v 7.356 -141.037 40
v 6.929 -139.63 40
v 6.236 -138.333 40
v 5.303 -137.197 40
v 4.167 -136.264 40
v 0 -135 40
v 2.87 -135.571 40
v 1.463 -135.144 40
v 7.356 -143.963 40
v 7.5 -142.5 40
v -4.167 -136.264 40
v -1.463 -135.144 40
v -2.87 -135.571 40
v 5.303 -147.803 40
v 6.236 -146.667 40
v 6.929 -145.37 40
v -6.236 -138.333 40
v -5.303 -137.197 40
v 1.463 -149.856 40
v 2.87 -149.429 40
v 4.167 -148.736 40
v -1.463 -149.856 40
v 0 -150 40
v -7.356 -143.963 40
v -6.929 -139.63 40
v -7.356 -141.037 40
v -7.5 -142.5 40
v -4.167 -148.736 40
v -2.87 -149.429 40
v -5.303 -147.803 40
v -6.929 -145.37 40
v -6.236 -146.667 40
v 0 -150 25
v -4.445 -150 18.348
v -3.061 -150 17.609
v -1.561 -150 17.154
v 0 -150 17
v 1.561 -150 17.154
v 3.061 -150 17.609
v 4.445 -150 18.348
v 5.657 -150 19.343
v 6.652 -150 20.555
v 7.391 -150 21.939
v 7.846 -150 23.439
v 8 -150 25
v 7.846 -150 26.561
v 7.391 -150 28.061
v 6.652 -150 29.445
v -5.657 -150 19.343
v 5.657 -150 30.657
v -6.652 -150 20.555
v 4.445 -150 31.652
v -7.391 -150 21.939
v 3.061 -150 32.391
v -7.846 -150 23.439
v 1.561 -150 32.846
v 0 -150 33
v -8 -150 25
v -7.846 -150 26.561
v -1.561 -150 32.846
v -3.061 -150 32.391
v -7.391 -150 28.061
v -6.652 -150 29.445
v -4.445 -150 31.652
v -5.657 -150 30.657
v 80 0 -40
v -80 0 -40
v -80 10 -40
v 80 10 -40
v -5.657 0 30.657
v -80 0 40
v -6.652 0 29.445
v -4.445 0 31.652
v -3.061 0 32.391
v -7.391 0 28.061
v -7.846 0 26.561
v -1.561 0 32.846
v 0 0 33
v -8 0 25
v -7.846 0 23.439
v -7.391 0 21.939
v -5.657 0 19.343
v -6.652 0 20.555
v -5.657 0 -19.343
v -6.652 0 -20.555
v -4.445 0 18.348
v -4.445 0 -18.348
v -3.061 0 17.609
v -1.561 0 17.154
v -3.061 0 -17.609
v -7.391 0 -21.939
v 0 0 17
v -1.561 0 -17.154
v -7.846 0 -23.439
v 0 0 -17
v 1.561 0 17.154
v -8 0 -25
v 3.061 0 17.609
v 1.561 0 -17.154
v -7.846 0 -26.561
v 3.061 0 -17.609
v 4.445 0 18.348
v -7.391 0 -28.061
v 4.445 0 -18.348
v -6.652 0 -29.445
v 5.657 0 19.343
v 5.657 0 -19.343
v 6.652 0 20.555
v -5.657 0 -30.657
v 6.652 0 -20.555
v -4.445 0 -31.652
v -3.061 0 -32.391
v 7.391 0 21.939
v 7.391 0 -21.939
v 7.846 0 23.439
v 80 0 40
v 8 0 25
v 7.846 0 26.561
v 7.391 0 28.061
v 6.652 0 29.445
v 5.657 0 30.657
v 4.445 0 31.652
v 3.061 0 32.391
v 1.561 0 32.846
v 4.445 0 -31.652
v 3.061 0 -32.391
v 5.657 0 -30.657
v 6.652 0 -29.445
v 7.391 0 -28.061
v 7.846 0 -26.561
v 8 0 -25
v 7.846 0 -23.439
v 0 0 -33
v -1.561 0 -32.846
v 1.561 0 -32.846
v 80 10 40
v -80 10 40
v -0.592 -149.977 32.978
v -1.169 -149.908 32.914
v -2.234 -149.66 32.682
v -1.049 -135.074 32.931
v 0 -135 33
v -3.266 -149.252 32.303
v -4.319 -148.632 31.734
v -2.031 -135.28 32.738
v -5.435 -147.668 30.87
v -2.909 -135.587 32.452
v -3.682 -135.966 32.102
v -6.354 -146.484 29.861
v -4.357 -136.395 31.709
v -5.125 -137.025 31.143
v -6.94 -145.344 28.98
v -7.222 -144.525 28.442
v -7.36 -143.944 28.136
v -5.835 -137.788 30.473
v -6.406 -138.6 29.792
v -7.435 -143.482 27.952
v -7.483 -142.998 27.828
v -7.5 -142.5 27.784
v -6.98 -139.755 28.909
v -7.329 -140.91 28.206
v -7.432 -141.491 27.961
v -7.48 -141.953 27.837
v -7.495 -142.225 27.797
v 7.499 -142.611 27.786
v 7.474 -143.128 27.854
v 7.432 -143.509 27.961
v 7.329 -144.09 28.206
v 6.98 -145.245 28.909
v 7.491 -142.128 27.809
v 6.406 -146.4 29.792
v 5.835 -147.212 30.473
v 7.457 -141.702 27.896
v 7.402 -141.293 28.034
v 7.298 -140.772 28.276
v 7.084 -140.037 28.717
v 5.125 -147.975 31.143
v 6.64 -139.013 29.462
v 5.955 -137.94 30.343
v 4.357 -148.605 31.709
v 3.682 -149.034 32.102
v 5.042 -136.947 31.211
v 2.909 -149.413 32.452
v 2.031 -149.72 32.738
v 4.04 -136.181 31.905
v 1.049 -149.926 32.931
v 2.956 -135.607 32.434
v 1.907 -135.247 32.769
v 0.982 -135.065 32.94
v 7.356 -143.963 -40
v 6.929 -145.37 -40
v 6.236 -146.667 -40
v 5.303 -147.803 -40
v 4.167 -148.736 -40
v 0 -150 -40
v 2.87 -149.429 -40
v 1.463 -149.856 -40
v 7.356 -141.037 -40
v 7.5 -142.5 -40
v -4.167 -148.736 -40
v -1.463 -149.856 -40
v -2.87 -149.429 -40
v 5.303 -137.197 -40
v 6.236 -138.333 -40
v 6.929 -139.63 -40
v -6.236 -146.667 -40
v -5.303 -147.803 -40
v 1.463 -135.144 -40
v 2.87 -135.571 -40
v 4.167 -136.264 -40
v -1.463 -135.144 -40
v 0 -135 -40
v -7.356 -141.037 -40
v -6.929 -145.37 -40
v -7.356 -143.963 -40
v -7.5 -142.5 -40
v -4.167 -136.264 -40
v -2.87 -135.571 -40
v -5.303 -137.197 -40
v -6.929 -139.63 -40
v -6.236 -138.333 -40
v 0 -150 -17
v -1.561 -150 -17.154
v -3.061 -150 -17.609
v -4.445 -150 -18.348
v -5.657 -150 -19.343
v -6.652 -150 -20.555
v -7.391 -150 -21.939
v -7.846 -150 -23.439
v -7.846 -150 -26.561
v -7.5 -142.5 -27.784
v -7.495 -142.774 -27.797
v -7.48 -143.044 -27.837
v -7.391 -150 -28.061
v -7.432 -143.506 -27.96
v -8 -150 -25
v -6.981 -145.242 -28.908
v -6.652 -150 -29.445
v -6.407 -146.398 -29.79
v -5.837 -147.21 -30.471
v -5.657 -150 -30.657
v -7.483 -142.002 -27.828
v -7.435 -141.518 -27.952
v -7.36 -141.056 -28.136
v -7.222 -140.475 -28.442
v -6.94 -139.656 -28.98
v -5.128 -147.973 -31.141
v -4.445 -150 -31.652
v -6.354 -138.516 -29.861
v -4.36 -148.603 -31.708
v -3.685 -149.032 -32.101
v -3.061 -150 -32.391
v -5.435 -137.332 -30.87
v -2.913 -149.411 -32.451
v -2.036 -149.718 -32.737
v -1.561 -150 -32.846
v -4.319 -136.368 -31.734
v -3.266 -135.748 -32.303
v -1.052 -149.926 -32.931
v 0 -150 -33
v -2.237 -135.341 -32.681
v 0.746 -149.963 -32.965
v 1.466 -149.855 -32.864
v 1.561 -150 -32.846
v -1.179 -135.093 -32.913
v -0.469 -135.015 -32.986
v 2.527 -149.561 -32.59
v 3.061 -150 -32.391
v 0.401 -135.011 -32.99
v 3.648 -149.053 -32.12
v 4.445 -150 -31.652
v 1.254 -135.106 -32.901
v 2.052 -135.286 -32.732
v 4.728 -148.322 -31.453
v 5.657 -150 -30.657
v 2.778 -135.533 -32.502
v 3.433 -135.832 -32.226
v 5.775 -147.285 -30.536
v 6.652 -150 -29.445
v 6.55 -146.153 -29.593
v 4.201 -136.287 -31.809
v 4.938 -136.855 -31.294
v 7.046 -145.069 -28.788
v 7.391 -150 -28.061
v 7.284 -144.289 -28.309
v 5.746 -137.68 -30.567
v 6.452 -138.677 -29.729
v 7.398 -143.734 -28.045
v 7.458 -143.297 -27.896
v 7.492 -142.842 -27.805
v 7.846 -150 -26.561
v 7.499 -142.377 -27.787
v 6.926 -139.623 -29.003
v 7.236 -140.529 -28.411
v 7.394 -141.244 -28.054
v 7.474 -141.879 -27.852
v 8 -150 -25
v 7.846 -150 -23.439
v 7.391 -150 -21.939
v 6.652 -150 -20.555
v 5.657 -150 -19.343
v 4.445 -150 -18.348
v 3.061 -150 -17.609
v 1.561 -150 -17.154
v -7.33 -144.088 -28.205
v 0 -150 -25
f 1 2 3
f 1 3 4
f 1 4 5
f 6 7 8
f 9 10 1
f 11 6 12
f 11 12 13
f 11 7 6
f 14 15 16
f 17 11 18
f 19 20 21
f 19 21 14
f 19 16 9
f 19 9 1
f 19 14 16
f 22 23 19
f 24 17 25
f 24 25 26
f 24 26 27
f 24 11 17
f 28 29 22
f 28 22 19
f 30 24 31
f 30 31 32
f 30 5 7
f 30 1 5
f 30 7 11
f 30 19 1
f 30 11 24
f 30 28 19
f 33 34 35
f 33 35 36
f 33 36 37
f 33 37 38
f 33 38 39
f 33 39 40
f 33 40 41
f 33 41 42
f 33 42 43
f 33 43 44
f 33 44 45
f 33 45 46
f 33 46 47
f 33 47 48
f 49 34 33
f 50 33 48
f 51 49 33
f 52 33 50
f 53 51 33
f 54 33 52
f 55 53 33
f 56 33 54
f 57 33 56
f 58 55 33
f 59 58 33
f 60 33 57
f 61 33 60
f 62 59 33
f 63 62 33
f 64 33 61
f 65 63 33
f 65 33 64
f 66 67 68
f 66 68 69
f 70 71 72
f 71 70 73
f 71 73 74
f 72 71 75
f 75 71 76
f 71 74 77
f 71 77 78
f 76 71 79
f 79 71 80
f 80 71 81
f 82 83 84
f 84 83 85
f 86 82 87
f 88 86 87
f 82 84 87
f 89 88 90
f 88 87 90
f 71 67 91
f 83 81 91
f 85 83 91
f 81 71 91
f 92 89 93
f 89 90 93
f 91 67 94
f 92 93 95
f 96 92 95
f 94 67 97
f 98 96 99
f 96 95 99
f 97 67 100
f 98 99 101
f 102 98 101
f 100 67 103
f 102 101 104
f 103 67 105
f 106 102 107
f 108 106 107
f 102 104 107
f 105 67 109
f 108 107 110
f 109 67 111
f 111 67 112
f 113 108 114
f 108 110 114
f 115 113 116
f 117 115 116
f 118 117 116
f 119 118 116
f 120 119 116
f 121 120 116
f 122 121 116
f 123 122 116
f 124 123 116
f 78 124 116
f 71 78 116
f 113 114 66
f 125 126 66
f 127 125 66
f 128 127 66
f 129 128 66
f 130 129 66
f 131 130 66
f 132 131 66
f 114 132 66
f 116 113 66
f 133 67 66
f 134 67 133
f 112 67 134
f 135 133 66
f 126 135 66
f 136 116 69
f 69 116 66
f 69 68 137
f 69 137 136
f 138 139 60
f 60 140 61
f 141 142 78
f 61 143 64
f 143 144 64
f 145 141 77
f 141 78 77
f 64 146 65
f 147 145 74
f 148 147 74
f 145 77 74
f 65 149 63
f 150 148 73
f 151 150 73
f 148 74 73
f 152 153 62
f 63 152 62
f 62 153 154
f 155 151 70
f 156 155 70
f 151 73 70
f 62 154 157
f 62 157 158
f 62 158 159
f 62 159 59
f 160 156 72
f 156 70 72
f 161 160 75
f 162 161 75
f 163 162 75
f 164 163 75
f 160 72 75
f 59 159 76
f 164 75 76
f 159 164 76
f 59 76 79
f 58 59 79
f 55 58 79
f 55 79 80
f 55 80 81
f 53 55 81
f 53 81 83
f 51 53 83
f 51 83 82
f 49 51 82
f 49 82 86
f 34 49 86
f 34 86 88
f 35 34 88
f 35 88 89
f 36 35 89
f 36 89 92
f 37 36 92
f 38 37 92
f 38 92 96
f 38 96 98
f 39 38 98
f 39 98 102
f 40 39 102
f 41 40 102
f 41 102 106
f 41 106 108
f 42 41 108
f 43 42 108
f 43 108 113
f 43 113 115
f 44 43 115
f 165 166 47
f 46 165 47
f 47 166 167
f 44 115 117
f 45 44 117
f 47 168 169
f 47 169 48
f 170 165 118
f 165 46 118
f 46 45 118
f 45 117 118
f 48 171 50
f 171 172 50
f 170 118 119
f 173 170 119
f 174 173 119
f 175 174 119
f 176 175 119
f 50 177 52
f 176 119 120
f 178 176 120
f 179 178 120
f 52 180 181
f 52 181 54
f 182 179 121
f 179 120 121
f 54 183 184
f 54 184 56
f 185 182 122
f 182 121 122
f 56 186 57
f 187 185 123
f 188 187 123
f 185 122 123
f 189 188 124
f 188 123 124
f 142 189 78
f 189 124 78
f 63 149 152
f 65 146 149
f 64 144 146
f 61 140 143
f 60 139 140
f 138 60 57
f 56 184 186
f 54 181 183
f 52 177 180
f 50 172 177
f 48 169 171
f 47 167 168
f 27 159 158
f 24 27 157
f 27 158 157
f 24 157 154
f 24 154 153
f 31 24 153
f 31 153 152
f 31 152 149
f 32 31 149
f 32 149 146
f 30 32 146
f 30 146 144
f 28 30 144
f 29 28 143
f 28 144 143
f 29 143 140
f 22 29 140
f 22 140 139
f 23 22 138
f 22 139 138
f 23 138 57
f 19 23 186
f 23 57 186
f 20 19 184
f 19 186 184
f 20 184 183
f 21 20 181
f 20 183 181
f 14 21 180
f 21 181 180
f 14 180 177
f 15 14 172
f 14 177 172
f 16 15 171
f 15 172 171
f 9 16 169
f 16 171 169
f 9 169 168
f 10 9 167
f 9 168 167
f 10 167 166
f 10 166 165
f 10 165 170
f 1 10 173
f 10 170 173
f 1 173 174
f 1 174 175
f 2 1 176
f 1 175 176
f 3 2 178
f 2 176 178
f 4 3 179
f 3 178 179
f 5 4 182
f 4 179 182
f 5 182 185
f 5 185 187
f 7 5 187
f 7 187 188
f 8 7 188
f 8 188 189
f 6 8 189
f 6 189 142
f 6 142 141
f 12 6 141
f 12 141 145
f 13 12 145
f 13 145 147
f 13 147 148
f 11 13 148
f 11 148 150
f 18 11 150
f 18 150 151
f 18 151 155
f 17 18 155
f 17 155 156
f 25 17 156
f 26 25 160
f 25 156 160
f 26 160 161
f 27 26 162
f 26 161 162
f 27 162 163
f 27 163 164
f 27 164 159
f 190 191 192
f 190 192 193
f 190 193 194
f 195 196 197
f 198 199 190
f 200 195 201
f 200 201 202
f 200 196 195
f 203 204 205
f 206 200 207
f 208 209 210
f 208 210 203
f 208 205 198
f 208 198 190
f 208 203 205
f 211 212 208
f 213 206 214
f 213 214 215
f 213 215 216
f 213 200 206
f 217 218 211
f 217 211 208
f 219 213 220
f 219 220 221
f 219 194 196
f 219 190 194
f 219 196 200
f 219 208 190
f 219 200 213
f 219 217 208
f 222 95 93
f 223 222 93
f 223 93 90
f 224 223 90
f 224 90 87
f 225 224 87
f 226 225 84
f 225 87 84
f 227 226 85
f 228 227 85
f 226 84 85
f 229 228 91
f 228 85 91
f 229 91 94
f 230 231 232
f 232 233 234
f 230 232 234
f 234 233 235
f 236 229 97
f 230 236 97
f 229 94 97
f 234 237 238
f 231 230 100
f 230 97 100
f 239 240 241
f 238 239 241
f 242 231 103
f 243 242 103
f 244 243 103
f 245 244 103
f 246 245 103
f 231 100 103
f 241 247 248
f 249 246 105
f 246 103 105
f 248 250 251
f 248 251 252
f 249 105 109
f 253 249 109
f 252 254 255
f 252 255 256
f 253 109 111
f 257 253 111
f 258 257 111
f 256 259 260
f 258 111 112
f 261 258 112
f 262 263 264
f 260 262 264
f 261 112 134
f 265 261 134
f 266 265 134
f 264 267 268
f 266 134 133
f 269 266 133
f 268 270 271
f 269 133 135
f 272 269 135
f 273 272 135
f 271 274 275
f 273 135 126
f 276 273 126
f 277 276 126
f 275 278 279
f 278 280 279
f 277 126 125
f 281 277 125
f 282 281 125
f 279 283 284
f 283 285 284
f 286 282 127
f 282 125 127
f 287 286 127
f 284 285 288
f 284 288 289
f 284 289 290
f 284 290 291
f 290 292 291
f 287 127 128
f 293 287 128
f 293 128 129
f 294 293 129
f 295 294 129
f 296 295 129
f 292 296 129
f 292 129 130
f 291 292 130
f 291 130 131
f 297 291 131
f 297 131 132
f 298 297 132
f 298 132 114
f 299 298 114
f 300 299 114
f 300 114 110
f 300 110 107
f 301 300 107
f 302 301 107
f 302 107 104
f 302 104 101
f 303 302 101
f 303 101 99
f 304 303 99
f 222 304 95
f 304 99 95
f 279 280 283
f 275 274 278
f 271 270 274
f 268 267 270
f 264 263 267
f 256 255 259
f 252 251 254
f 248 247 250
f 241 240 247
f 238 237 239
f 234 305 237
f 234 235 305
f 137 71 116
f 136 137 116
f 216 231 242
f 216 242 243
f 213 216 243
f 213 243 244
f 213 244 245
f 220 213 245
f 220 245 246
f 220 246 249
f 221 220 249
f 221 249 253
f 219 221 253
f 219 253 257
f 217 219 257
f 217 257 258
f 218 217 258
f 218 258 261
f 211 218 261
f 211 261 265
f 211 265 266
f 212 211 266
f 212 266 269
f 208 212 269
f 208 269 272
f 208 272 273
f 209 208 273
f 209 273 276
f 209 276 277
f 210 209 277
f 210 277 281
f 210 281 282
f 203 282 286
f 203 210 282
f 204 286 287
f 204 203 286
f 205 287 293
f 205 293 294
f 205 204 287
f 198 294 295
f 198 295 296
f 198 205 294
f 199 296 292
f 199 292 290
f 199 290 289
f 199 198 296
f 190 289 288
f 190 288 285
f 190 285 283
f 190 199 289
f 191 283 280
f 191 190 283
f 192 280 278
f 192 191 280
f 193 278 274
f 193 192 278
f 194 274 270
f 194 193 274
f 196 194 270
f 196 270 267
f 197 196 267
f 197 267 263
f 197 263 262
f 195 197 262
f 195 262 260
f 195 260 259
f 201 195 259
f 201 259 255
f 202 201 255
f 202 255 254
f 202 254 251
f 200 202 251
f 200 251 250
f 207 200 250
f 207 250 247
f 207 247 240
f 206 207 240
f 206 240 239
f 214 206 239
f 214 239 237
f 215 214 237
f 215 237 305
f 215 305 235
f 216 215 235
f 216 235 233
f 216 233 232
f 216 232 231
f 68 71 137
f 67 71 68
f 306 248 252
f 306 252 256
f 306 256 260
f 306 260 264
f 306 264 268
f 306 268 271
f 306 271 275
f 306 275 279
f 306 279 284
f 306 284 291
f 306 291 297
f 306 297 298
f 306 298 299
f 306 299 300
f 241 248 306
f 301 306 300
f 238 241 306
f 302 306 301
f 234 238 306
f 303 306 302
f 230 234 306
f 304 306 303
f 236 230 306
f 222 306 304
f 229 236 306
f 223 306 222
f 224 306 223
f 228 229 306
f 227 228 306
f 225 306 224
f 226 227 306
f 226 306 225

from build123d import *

# Parameters (mm, degrees)
SKETCH_1_W      = 160
SKETCH_1_H      = 80
EXTRUDE_1_DEPTH = 10
SKETCH_2_R      = 8
EXTRUDE_2_DEPTH = 150
SKETCH_3_R      = 7.5
EXTRUDE_3_DEPTH = 15
EXTRUDE_START   = -15
SKETCH_4_R      = 7.5
EXTRUDE_4_DEPTH = 15


with BuildPart() as part:
    # 草图1 → 凸台-拉伸1 (new body)
    with BuildSketch(Plane(origin=(0, 0, 0), x_dir=(1, 0, 0), z_dir=(0, 1, 0))):
        Rectangle(SKETCH_1_W, SKETCH_1_H)
    extrude(amount=EXTRUDE_1_DEPTH)

    # 草图2 → 凸台-拉伸2 (add)
    with BuildSketch(Plane.XZ):
        with Locations(Location((0, 25, 0), (0, 0, 90))):
            Circle(SKETCH_2_R)
        with Locations(Location((0, -25, 0), (0, 0, 90))):
            Circle(SKETCH_2_R)
    extrude(amount=EXTRUDE_2_DEPTH)

    # 草图3 → 凸台-拉伸3 (add)
    with BuildSketch(Plane(origin=(0, 0, -40), x_dir=(-1, 0, 0), z_dir=(0, 0, -1))):
        with Locations((0, -142.5)):
            Circle(SKETCH_3_R)
    extrude(amount=-EXTRUDE_3_DEPTH)

    # 草图4 → 凸台-拉伸4 (add)
    with BuildSketch(Plane.XY.offset(40).offset(EXTRUDE_START)):
        with Locations(Location((0, -142.5, 0), (0, 0, 180))):
            Circle(SKETCH_4_R)
    extrude(amount=EXTRUDE_4_DEPTH)


solid = part.part
